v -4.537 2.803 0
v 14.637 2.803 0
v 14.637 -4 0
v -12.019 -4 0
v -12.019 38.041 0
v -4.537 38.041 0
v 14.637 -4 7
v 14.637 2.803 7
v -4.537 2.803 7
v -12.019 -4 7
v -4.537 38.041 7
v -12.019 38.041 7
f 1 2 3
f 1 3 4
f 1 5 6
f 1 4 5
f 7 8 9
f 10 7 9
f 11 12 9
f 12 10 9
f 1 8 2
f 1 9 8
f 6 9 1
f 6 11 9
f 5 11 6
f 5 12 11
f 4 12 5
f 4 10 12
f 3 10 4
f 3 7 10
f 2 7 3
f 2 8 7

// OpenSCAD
// file: glyph.scad
// glyph — the shared geometry of every letter in the set. Defines named geometry
// only, so it renders nothing on its own; each letter part includes it and calls
// letter(). Every dimension lives in ../../lib/common.scad.
//
// A LETTER IS NOTHING BUT A LETTER. No plinth, no tongue, no tab — it is the
// bare glyph, and it attaches by standing in the deck groove and resting on the
// groove's floor. Anything else on it would be a distraction on a learning toy.
//
// It is a flat plate of one thickness, printed face-down: no overhang anywhere,
// no supports, and the face on the bed comes out smoothest.
//
// TWO TRAPS WITH text():
//
//  * A missing font FALLS BACK SILENTLY — no warning, no error, just different
//    letters. "Liberation Sans" was the first choice here because OpenSCAD
//    bundles it; on macOS the bundled faces are not registered with fontconfig,
//    so it rendered the fallback face instead and nothing said so. To check a
//    font resolved, render a string with it and with a deliberately bogus name
//    and compare bounding boxes: identical means it fell back.
//  * `size` is not the cap height in general. For Helvetica Bold they coincide
//    (size 44 -> 44.0 mm cap), which is why letter_size reads as a height.
//    Change the font and re-measure.

include <../../lib/common.scad>

// The letter's outline, upright in the XY plane, ready to be extruded along Z
// (which is the letter's thickness, and the print's build axis).
//
//   y = 0   is the deck surface
//   y < 0   is the part standing down inside the groove. It reaches letter_bury,
//           which is where the tapered groove closes to letter_t — NOT the
//           groove's floor. The letter wedges; it never bottoms out.
module glyph_2d(ch) {
    intersection() {
        translate([0, -letter_bury])
            scale([letter_condense, 1])
                text(ch, size = letter_size, font = letter_font,
                     halign = "center", valign = "baseline");
        // Trimmed flat at the baseline. Round letters (O, C, G, S) overshoot the
        // baseline by design, and a letter standing on a convex curve rocks —
        // there is nothing to stop it leaning. The trim costs nothing visible
        // and gives every letter a flat foot on the groove floor.
        translate([-200, -letter_bury]) square([400, 400]);
    }
}

// One letter, in its print orientation: lying on its face, thickness up Z.
module letter(ch) {
    linear_extrude(letter_t) glyph_2d(ch);
}

// Where that letter sits once it is dropped into a chassis, for fit checks.
module letter_fitted(ch) {
    translate([0, letter_t/2, body_top]) rotate([90, 0, 0]) letter(ch);
}
// main file
// letter L — one part. See glyph.scad for the geometry and lib/common.scad for
// the dimensions. Prints lying on its face, exactly as exported: no supports.

include <glyph.scad>

letter("L");
